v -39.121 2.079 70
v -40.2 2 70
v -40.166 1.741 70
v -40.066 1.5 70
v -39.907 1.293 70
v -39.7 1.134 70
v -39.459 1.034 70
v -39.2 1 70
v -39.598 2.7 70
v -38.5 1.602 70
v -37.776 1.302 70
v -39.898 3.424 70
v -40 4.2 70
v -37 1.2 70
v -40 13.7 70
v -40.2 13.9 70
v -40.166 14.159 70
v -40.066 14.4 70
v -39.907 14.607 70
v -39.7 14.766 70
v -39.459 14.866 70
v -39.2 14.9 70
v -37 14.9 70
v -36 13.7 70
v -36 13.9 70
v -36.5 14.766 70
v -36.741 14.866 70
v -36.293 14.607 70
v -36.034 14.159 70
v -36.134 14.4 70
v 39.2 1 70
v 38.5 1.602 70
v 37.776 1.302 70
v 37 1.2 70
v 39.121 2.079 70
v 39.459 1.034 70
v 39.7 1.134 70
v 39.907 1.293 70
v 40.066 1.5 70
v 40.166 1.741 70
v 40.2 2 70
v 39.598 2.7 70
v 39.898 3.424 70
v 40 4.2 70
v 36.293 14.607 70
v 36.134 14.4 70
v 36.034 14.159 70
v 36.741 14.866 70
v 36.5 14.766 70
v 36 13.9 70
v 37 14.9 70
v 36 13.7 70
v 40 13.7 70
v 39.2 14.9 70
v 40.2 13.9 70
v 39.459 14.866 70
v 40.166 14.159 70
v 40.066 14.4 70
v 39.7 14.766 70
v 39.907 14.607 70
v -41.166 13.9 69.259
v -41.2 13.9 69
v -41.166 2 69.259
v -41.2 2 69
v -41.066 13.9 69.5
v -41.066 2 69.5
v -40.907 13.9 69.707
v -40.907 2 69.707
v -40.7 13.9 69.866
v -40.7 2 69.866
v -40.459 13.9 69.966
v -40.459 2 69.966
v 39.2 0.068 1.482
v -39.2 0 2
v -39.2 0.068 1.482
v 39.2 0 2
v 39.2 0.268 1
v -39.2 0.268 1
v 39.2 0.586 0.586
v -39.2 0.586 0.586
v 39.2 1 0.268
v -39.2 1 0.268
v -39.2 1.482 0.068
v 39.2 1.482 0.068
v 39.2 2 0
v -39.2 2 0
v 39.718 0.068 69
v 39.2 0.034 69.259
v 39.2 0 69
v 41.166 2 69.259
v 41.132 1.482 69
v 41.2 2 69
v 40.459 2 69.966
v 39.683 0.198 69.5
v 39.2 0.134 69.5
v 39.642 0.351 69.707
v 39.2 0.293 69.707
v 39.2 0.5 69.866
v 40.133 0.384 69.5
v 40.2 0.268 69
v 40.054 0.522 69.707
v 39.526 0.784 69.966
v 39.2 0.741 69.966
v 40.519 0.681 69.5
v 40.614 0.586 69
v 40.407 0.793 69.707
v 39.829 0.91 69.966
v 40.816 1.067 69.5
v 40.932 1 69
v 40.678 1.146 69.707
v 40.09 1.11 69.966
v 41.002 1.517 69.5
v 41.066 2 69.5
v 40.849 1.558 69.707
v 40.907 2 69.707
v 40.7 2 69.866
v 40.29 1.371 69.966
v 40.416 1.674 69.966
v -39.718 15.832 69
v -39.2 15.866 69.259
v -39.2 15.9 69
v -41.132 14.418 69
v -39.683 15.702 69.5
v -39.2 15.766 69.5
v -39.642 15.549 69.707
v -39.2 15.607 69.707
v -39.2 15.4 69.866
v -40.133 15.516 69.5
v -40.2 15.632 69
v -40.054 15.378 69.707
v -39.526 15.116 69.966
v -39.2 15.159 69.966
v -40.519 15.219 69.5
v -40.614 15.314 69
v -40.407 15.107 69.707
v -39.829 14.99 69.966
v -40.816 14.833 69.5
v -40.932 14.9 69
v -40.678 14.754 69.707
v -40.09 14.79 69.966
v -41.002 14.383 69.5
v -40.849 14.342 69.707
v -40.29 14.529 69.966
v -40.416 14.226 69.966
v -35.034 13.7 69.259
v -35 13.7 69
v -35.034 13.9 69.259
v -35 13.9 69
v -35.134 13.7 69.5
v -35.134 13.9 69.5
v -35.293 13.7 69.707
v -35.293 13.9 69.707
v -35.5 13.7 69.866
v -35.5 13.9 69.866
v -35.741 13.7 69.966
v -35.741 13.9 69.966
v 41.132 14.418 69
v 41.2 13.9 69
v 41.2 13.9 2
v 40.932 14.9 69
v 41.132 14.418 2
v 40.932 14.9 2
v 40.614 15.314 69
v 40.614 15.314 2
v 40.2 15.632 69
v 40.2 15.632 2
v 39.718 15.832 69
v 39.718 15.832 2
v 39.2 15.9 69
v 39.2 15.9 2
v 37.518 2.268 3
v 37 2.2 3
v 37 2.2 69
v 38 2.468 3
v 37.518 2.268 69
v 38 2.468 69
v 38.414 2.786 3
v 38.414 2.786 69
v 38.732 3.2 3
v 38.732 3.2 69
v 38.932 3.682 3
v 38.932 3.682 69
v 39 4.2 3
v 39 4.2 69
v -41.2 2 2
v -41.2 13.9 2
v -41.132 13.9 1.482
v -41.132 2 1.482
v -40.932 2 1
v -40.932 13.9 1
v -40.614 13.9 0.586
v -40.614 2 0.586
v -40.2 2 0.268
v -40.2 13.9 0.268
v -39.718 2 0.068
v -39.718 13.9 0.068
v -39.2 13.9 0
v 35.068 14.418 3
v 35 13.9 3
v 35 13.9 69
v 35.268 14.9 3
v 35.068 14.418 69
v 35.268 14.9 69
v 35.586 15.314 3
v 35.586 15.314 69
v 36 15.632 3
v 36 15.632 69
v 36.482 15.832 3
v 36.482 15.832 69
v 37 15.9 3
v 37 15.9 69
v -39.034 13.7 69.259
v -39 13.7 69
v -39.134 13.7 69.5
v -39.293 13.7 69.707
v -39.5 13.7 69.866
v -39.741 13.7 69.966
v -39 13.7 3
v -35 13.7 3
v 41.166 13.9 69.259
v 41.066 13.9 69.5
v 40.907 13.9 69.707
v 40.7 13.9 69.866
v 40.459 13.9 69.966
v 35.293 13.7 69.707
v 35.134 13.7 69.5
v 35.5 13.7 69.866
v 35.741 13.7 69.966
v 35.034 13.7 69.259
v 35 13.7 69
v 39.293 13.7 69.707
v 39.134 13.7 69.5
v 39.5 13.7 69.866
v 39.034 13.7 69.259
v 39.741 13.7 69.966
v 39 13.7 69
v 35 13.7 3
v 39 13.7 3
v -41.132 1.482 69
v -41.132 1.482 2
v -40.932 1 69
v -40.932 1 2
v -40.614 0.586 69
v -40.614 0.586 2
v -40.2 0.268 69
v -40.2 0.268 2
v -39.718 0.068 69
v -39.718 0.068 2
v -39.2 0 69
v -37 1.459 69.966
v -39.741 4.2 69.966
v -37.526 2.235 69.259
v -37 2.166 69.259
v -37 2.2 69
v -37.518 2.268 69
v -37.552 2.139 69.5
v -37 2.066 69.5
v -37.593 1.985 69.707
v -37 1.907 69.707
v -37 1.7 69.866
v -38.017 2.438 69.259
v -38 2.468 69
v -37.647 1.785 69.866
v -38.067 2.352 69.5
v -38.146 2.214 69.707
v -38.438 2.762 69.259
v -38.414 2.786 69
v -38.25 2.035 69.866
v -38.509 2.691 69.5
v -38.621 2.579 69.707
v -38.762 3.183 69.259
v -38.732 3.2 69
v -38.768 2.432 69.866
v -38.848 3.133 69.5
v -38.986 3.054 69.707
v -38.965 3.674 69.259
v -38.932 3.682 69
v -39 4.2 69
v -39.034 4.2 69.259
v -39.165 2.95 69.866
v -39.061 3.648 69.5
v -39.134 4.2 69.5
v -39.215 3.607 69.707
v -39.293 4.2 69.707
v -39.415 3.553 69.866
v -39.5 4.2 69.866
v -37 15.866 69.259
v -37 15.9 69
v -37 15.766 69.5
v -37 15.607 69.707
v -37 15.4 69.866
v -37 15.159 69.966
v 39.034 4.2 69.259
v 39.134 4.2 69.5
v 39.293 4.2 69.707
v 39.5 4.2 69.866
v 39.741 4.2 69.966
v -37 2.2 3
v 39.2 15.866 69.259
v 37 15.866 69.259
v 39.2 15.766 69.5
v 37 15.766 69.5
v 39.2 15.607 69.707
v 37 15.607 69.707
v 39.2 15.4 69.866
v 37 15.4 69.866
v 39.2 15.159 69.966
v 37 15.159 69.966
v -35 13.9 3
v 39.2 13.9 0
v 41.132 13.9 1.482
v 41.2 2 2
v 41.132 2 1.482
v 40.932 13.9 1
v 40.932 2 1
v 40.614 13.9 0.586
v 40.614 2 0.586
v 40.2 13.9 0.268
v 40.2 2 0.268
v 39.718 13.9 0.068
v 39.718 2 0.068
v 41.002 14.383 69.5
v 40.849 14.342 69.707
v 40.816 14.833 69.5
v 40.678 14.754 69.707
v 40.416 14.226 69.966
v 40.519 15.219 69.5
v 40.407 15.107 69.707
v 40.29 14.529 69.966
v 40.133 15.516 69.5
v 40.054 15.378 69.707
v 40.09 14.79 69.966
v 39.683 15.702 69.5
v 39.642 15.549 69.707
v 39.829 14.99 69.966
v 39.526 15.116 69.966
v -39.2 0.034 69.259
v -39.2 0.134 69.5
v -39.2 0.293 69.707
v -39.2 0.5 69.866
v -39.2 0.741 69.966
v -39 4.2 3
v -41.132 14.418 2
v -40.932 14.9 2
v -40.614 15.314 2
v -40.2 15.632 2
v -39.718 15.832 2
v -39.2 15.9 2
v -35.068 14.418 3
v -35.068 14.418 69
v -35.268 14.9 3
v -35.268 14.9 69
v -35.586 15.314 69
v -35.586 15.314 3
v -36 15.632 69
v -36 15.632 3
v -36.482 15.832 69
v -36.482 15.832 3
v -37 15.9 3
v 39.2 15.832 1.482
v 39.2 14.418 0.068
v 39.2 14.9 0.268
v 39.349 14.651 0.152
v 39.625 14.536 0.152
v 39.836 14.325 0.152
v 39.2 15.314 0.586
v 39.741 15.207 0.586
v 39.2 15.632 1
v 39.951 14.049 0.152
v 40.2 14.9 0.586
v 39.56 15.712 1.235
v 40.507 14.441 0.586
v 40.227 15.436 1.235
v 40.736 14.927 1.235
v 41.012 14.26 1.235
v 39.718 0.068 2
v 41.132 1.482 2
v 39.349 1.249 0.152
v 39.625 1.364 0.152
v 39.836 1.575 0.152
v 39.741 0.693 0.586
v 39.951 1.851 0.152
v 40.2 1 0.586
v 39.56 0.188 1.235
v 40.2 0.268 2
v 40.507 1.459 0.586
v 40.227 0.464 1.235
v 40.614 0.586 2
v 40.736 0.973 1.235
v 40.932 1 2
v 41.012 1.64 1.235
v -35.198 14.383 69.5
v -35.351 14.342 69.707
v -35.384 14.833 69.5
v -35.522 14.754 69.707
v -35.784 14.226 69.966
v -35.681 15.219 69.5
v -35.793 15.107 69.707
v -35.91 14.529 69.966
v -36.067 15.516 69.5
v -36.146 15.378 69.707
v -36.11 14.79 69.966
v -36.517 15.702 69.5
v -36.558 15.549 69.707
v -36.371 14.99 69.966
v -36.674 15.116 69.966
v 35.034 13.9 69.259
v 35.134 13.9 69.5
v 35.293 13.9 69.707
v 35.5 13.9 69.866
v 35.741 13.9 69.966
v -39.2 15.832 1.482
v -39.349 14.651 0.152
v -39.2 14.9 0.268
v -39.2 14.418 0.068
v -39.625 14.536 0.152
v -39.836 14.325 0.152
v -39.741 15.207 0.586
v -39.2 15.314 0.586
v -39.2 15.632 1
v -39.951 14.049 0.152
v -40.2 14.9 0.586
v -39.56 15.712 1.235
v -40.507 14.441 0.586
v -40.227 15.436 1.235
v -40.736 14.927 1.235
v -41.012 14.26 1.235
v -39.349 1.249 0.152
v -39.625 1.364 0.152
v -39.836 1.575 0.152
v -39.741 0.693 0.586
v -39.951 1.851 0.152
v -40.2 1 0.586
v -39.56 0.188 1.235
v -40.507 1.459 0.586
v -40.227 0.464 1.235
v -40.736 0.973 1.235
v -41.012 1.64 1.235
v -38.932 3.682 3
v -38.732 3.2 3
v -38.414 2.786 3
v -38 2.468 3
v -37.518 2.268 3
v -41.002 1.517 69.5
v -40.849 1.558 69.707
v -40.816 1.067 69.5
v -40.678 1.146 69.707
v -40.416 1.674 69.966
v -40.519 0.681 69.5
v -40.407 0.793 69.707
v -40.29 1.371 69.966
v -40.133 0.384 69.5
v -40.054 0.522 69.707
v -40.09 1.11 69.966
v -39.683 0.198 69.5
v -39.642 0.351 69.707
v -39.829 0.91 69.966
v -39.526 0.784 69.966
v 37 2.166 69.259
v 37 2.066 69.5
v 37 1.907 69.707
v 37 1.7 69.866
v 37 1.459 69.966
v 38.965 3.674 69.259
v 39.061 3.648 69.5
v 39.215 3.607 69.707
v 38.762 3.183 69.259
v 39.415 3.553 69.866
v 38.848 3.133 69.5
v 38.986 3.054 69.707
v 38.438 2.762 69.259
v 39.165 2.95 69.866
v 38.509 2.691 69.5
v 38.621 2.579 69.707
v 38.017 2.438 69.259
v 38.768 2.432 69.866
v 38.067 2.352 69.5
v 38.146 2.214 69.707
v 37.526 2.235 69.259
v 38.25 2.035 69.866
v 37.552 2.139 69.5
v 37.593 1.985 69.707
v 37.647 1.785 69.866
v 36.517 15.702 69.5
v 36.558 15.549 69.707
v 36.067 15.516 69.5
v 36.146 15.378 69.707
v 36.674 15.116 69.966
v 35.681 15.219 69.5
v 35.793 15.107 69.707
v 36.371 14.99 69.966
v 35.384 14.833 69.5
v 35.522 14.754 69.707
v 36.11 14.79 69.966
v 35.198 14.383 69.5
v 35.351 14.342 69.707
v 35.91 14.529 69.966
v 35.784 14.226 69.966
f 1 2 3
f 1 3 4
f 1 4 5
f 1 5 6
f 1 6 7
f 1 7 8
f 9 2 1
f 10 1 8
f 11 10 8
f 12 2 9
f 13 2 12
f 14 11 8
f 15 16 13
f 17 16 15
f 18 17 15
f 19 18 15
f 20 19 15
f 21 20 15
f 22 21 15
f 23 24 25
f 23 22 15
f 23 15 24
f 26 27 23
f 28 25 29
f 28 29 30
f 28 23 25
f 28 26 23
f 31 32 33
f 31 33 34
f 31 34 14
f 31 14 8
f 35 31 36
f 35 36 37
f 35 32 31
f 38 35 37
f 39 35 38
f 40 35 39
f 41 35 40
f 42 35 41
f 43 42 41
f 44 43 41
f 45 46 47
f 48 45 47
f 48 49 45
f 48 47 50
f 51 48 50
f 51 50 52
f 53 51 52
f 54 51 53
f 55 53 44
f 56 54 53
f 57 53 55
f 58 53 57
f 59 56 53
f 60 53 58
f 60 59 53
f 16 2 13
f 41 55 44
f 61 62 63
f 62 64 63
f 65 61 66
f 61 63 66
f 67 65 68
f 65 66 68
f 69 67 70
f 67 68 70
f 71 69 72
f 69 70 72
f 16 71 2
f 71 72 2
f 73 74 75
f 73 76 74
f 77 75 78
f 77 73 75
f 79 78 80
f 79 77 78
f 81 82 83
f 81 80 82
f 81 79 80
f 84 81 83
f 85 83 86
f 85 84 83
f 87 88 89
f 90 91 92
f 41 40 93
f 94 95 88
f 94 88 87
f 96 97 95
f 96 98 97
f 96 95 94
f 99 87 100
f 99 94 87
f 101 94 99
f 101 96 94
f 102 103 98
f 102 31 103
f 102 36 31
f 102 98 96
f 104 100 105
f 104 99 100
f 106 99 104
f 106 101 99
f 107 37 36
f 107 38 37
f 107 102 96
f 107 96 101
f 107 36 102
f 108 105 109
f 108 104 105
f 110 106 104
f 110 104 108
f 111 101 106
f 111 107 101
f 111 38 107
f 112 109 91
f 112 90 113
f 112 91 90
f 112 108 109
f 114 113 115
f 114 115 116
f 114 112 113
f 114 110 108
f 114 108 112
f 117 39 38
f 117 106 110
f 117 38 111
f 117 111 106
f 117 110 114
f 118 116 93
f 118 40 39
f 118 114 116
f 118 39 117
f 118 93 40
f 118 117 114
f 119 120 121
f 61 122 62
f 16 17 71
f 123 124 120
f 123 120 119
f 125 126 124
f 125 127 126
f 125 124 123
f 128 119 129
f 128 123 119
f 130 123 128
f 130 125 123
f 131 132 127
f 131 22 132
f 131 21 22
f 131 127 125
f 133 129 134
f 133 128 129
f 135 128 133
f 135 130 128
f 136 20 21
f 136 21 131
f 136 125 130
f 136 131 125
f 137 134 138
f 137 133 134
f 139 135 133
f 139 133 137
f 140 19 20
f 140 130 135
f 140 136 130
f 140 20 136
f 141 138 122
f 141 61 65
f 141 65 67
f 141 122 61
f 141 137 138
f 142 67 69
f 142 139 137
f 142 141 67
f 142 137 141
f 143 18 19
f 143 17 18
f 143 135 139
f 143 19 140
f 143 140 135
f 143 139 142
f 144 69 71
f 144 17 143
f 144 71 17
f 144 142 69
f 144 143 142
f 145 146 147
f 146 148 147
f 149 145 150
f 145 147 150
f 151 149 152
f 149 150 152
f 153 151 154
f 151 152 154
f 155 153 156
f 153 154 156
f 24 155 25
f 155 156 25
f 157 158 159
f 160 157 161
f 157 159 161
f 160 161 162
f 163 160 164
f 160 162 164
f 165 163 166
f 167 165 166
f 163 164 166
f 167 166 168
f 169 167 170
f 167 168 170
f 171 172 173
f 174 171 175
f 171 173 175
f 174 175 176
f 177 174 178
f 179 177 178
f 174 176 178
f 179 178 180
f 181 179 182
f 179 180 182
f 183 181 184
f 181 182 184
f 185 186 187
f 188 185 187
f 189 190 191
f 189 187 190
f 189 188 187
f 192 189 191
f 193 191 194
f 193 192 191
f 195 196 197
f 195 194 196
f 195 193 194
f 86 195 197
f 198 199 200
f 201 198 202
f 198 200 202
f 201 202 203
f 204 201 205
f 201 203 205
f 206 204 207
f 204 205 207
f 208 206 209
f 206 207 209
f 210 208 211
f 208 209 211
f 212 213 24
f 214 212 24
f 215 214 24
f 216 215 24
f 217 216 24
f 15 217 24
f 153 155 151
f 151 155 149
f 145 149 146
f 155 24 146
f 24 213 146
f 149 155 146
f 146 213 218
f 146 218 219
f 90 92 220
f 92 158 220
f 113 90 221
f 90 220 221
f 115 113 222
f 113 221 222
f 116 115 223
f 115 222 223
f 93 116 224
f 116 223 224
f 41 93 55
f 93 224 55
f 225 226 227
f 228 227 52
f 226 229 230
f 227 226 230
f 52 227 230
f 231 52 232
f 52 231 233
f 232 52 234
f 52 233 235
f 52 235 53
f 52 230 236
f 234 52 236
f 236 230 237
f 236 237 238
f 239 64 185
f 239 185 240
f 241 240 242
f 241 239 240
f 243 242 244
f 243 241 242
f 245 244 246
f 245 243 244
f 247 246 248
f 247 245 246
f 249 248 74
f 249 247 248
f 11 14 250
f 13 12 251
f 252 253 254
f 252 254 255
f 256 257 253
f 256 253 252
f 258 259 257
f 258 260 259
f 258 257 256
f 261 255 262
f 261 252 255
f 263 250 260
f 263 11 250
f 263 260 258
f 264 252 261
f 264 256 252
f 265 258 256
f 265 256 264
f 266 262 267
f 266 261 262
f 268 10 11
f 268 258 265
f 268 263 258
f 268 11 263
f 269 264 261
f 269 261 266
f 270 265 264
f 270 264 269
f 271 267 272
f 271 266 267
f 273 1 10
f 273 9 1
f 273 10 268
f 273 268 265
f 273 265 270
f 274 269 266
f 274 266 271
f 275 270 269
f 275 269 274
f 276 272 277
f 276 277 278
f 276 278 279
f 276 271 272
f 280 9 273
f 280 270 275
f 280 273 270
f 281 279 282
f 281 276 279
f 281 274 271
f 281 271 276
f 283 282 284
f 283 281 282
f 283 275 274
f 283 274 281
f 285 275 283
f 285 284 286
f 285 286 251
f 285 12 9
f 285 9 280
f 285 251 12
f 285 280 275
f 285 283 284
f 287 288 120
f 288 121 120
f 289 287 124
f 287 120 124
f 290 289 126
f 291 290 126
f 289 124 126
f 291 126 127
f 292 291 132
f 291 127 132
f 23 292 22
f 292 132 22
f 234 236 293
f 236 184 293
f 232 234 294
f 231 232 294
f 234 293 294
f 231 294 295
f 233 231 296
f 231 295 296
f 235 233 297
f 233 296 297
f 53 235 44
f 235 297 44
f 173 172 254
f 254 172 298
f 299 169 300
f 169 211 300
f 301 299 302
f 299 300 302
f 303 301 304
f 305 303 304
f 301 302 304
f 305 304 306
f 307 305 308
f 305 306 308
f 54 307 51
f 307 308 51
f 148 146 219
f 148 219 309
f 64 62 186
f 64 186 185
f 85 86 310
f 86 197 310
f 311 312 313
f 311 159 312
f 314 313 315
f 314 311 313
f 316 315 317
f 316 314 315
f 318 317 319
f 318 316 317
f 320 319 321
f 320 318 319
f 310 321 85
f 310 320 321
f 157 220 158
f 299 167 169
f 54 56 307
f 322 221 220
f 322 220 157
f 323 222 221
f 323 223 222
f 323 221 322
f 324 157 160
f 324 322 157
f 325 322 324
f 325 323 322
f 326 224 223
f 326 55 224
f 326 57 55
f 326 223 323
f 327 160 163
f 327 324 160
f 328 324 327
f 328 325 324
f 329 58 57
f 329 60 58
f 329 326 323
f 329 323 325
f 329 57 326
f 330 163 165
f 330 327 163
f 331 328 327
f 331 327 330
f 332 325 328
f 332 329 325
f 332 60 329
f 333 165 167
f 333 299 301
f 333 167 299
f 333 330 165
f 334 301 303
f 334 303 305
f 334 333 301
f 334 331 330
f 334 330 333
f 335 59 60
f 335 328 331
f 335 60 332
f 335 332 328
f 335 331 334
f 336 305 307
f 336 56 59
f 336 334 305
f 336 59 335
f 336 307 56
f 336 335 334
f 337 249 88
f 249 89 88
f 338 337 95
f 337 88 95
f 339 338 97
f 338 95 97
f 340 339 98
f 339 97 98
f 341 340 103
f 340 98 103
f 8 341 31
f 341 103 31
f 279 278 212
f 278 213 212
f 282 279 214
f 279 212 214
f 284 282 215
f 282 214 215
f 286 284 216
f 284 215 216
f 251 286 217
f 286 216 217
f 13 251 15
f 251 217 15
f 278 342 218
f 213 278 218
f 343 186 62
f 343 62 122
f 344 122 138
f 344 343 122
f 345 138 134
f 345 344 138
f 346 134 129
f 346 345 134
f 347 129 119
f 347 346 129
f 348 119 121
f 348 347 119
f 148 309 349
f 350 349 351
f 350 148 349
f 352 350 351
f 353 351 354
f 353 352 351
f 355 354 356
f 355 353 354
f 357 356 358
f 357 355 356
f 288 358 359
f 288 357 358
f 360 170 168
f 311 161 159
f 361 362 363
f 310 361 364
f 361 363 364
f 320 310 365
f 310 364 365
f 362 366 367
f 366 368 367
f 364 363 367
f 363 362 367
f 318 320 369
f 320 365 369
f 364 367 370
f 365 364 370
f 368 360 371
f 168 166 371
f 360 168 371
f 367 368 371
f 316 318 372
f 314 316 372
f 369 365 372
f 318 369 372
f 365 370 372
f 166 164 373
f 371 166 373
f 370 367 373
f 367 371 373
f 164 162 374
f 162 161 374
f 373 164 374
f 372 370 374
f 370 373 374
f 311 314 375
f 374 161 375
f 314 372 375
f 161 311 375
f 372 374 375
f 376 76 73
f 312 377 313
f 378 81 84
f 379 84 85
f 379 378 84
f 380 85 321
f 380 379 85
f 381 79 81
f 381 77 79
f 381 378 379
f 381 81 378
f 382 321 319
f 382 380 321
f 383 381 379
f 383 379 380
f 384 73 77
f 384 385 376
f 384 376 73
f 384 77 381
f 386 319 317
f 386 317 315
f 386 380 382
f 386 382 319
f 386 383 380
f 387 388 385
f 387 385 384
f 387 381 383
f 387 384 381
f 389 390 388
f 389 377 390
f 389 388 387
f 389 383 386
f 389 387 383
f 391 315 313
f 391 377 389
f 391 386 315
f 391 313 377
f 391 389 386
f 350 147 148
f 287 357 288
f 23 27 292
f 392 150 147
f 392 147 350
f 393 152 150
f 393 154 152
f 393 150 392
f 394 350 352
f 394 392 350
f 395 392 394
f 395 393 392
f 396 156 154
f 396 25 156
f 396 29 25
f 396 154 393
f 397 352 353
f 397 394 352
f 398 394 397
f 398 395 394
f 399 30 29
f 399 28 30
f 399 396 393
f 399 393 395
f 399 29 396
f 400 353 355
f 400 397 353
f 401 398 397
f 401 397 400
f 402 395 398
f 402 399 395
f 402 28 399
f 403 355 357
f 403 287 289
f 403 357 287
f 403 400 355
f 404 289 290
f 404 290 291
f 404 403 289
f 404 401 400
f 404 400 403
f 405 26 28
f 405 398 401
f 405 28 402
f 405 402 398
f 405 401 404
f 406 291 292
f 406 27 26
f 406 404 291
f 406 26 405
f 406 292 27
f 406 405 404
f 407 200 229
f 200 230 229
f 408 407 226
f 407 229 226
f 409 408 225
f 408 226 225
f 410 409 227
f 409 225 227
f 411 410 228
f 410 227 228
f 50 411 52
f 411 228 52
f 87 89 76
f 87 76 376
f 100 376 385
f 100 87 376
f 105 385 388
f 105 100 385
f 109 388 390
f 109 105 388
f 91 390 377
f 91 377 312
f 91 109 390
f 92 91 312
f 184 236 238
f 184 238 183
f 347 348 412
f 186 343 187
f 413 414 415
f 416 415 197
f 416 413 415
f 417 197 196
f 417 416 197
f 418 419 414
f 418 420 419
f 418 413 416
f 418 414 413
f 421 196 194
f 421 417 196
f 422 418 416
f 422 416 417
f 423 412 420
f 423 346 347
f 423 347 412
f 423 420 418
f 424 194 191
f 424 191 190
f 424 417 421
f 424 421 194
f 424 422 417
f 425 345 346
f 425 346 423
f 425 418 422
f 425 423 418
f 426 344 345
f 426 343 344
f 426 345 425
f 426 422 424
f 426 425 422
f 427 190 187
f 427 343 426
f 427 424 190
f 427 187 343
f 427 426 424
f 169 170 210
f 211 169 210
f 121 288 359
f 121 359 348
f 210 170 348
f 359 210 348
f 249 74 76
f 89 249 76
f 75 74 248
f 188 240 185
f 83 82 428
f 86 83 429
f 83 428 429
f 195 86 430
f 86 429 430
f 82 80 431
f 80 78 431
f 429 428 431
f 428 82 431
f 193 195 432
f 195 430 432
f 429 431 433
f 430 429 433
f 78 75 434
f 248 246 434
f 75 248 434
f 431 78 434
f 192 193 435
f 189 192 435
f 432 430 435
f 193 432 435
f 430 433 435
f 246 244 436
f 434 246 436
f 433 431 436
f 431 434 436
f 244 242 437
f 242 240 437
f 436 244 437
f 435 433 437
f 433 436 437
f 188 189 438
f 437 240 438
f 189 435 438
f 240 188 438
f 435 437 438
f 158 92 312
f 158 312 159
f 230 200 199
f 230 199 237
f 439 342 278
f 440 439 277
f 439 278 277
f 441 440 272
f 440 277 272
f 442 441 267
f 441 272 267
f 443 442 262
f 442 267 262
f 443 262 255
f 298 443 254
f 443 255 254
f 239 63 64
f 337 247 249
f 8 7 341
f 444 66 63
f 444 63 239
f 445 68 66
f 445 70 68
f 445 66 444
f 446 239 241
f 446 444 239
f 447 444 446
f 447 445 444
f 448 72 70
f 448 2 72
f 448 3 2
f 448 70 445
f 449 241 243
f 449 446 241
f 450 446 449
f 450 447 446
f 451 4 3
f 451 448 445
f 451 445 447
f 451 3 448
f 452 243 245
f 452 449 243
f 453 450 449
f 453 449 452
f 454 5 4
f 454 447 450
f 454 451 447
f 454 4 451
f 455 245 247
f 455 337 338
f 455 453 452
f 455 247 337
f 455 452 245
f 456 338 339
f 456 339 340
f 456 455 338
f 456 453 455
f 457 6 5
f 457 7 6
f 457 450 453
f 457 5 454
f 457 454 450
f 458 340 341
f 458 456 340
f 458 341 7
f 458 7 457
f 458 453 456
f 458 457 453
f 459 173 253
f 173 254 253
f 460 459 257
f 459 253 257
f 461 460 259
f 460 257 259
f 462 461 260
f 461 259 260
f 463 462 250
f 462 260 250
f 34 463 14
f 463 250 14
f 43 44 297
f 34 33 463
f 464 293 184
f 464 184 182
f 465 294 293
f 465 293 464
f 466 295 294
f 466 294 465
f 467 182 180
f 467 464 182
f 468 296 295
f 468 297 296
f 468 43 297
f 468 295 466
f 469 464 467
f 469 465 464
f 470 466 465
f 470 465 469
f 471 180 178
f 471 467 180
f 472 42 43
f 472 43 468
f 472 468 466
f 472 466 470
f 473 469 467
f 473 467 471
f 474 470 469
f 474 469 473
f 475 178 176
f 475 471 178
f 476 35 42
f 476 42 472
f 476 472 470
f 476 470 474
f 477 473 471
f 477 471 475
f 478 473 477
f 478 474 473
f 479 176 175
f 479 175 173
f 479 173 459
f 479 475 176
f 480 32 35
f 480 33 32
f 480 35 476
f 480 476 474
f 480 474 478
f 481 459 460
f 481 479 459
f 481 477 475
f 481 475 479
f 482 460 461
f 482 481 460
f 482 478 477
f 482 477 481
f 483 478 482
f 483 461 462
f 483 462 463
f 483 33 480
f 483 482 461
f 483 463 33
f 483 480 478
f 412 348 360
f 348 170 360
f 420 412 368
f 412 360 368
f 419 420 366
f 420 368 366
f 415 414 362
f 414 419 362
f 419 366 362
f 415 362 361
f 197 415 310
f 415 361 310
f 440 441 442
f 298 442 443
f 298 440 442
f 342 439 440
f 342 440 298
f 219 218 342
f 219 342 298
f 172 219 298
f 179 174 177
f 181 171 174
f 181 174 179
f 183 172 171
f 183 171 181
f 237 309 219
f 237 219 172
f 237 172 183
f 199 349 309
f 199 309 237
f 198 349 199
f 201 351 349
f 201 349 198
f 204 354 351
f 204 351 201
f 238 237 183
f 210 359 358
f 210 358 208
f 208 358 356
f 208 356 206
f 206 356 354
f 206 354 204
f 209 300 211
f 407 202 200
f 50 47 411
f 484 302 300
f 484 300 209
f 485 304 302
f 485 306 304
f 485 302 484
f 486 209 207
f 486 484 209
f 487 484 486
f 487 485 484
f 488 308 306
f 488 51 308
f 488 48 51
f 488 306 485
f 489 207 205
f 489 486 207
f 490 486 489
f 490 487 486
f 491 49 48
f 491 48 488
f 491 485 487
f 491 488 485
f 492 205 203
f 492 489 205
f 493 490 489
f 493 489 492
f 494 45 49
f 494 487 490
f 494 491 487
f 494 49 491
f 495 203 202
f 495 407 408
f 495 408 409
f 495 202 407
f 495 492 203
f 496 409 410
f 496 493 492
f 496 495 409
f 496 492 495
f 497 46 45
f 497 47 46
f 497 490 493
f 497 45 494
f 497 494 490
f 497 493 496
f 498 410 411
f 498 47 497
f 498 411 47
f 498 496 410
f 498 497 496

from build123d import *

# Parameters (mm, degrees)
F1_DEPTH = 70
F3_DEPTH = 3
F4_R     = 2
F5_R     = 1


with BuildPart() as f1:
    # F0 (on Top) → F1 (new body)
    with BuildSketch(Plane.XY):
        Polygon((-41.2, 0), (0, 0), (0, 2.2), (-39, 2.2), (-39, 13.7), (-35, 13.7), (-35, 15.9), (-41.2, 15.9), align=None)
        Polygon((0, 2.2), (0, 0), (41.2, 0), (41.2, 14.6), (41.2, 15.9), (35, 15.9), (35, 13.7), (39, 13.7), (39, 2.2), align=None)
    extrude(amount=F1_DEPTH)

    # F2 (on face) → F3 (join)
    with BuildSketch(Plane.XY):
        Polygon((0, 0), (41.2, 0), (41.2, 15.9), (-35, 15.9), (-35, 13.7), (-39, 13.7), (-39, 2.2), (0, 2.2), align=None)
        Polygon((-41.2, 0), (0, 0), (0, 2.2), (-39, 2.2), (-39, 13.7), (-35, 13.7), (-35, 15.9), (-41.2, 15.9), align=None)
    extrude(amount=F3_DEPTH)

    # F4
    f4_edges = [f1.edges().sort_by_distance(p)[0] for p in [
        (41.2, 0, 35),
        (41.2, 15.9, 35),
        (35, 15.9, 36.5),
        (39, 2.2, 36.5),
        (-35, 15.9, 36.5),
        (-39, 2.2, 36.5),
        (-41.2, 15.9, 35),
        (-41.2, 0, 35),
        (0, 0, 0),
        (0, 15.9, 0),
        (-41.2, 7.95, 0),
        (41.2, 7.95, 0),
    ]]
    fillet(f4_edges, radius=F4_R)

    # F5
    f5_edges = [f1.edges().sort_by_distance(p)[0] for p in [
        (0, 2.2, 70),
        (0, 0, 70),
    ]]
    fillet(f5_edges, radius=F5_R)


solid = f1.part
